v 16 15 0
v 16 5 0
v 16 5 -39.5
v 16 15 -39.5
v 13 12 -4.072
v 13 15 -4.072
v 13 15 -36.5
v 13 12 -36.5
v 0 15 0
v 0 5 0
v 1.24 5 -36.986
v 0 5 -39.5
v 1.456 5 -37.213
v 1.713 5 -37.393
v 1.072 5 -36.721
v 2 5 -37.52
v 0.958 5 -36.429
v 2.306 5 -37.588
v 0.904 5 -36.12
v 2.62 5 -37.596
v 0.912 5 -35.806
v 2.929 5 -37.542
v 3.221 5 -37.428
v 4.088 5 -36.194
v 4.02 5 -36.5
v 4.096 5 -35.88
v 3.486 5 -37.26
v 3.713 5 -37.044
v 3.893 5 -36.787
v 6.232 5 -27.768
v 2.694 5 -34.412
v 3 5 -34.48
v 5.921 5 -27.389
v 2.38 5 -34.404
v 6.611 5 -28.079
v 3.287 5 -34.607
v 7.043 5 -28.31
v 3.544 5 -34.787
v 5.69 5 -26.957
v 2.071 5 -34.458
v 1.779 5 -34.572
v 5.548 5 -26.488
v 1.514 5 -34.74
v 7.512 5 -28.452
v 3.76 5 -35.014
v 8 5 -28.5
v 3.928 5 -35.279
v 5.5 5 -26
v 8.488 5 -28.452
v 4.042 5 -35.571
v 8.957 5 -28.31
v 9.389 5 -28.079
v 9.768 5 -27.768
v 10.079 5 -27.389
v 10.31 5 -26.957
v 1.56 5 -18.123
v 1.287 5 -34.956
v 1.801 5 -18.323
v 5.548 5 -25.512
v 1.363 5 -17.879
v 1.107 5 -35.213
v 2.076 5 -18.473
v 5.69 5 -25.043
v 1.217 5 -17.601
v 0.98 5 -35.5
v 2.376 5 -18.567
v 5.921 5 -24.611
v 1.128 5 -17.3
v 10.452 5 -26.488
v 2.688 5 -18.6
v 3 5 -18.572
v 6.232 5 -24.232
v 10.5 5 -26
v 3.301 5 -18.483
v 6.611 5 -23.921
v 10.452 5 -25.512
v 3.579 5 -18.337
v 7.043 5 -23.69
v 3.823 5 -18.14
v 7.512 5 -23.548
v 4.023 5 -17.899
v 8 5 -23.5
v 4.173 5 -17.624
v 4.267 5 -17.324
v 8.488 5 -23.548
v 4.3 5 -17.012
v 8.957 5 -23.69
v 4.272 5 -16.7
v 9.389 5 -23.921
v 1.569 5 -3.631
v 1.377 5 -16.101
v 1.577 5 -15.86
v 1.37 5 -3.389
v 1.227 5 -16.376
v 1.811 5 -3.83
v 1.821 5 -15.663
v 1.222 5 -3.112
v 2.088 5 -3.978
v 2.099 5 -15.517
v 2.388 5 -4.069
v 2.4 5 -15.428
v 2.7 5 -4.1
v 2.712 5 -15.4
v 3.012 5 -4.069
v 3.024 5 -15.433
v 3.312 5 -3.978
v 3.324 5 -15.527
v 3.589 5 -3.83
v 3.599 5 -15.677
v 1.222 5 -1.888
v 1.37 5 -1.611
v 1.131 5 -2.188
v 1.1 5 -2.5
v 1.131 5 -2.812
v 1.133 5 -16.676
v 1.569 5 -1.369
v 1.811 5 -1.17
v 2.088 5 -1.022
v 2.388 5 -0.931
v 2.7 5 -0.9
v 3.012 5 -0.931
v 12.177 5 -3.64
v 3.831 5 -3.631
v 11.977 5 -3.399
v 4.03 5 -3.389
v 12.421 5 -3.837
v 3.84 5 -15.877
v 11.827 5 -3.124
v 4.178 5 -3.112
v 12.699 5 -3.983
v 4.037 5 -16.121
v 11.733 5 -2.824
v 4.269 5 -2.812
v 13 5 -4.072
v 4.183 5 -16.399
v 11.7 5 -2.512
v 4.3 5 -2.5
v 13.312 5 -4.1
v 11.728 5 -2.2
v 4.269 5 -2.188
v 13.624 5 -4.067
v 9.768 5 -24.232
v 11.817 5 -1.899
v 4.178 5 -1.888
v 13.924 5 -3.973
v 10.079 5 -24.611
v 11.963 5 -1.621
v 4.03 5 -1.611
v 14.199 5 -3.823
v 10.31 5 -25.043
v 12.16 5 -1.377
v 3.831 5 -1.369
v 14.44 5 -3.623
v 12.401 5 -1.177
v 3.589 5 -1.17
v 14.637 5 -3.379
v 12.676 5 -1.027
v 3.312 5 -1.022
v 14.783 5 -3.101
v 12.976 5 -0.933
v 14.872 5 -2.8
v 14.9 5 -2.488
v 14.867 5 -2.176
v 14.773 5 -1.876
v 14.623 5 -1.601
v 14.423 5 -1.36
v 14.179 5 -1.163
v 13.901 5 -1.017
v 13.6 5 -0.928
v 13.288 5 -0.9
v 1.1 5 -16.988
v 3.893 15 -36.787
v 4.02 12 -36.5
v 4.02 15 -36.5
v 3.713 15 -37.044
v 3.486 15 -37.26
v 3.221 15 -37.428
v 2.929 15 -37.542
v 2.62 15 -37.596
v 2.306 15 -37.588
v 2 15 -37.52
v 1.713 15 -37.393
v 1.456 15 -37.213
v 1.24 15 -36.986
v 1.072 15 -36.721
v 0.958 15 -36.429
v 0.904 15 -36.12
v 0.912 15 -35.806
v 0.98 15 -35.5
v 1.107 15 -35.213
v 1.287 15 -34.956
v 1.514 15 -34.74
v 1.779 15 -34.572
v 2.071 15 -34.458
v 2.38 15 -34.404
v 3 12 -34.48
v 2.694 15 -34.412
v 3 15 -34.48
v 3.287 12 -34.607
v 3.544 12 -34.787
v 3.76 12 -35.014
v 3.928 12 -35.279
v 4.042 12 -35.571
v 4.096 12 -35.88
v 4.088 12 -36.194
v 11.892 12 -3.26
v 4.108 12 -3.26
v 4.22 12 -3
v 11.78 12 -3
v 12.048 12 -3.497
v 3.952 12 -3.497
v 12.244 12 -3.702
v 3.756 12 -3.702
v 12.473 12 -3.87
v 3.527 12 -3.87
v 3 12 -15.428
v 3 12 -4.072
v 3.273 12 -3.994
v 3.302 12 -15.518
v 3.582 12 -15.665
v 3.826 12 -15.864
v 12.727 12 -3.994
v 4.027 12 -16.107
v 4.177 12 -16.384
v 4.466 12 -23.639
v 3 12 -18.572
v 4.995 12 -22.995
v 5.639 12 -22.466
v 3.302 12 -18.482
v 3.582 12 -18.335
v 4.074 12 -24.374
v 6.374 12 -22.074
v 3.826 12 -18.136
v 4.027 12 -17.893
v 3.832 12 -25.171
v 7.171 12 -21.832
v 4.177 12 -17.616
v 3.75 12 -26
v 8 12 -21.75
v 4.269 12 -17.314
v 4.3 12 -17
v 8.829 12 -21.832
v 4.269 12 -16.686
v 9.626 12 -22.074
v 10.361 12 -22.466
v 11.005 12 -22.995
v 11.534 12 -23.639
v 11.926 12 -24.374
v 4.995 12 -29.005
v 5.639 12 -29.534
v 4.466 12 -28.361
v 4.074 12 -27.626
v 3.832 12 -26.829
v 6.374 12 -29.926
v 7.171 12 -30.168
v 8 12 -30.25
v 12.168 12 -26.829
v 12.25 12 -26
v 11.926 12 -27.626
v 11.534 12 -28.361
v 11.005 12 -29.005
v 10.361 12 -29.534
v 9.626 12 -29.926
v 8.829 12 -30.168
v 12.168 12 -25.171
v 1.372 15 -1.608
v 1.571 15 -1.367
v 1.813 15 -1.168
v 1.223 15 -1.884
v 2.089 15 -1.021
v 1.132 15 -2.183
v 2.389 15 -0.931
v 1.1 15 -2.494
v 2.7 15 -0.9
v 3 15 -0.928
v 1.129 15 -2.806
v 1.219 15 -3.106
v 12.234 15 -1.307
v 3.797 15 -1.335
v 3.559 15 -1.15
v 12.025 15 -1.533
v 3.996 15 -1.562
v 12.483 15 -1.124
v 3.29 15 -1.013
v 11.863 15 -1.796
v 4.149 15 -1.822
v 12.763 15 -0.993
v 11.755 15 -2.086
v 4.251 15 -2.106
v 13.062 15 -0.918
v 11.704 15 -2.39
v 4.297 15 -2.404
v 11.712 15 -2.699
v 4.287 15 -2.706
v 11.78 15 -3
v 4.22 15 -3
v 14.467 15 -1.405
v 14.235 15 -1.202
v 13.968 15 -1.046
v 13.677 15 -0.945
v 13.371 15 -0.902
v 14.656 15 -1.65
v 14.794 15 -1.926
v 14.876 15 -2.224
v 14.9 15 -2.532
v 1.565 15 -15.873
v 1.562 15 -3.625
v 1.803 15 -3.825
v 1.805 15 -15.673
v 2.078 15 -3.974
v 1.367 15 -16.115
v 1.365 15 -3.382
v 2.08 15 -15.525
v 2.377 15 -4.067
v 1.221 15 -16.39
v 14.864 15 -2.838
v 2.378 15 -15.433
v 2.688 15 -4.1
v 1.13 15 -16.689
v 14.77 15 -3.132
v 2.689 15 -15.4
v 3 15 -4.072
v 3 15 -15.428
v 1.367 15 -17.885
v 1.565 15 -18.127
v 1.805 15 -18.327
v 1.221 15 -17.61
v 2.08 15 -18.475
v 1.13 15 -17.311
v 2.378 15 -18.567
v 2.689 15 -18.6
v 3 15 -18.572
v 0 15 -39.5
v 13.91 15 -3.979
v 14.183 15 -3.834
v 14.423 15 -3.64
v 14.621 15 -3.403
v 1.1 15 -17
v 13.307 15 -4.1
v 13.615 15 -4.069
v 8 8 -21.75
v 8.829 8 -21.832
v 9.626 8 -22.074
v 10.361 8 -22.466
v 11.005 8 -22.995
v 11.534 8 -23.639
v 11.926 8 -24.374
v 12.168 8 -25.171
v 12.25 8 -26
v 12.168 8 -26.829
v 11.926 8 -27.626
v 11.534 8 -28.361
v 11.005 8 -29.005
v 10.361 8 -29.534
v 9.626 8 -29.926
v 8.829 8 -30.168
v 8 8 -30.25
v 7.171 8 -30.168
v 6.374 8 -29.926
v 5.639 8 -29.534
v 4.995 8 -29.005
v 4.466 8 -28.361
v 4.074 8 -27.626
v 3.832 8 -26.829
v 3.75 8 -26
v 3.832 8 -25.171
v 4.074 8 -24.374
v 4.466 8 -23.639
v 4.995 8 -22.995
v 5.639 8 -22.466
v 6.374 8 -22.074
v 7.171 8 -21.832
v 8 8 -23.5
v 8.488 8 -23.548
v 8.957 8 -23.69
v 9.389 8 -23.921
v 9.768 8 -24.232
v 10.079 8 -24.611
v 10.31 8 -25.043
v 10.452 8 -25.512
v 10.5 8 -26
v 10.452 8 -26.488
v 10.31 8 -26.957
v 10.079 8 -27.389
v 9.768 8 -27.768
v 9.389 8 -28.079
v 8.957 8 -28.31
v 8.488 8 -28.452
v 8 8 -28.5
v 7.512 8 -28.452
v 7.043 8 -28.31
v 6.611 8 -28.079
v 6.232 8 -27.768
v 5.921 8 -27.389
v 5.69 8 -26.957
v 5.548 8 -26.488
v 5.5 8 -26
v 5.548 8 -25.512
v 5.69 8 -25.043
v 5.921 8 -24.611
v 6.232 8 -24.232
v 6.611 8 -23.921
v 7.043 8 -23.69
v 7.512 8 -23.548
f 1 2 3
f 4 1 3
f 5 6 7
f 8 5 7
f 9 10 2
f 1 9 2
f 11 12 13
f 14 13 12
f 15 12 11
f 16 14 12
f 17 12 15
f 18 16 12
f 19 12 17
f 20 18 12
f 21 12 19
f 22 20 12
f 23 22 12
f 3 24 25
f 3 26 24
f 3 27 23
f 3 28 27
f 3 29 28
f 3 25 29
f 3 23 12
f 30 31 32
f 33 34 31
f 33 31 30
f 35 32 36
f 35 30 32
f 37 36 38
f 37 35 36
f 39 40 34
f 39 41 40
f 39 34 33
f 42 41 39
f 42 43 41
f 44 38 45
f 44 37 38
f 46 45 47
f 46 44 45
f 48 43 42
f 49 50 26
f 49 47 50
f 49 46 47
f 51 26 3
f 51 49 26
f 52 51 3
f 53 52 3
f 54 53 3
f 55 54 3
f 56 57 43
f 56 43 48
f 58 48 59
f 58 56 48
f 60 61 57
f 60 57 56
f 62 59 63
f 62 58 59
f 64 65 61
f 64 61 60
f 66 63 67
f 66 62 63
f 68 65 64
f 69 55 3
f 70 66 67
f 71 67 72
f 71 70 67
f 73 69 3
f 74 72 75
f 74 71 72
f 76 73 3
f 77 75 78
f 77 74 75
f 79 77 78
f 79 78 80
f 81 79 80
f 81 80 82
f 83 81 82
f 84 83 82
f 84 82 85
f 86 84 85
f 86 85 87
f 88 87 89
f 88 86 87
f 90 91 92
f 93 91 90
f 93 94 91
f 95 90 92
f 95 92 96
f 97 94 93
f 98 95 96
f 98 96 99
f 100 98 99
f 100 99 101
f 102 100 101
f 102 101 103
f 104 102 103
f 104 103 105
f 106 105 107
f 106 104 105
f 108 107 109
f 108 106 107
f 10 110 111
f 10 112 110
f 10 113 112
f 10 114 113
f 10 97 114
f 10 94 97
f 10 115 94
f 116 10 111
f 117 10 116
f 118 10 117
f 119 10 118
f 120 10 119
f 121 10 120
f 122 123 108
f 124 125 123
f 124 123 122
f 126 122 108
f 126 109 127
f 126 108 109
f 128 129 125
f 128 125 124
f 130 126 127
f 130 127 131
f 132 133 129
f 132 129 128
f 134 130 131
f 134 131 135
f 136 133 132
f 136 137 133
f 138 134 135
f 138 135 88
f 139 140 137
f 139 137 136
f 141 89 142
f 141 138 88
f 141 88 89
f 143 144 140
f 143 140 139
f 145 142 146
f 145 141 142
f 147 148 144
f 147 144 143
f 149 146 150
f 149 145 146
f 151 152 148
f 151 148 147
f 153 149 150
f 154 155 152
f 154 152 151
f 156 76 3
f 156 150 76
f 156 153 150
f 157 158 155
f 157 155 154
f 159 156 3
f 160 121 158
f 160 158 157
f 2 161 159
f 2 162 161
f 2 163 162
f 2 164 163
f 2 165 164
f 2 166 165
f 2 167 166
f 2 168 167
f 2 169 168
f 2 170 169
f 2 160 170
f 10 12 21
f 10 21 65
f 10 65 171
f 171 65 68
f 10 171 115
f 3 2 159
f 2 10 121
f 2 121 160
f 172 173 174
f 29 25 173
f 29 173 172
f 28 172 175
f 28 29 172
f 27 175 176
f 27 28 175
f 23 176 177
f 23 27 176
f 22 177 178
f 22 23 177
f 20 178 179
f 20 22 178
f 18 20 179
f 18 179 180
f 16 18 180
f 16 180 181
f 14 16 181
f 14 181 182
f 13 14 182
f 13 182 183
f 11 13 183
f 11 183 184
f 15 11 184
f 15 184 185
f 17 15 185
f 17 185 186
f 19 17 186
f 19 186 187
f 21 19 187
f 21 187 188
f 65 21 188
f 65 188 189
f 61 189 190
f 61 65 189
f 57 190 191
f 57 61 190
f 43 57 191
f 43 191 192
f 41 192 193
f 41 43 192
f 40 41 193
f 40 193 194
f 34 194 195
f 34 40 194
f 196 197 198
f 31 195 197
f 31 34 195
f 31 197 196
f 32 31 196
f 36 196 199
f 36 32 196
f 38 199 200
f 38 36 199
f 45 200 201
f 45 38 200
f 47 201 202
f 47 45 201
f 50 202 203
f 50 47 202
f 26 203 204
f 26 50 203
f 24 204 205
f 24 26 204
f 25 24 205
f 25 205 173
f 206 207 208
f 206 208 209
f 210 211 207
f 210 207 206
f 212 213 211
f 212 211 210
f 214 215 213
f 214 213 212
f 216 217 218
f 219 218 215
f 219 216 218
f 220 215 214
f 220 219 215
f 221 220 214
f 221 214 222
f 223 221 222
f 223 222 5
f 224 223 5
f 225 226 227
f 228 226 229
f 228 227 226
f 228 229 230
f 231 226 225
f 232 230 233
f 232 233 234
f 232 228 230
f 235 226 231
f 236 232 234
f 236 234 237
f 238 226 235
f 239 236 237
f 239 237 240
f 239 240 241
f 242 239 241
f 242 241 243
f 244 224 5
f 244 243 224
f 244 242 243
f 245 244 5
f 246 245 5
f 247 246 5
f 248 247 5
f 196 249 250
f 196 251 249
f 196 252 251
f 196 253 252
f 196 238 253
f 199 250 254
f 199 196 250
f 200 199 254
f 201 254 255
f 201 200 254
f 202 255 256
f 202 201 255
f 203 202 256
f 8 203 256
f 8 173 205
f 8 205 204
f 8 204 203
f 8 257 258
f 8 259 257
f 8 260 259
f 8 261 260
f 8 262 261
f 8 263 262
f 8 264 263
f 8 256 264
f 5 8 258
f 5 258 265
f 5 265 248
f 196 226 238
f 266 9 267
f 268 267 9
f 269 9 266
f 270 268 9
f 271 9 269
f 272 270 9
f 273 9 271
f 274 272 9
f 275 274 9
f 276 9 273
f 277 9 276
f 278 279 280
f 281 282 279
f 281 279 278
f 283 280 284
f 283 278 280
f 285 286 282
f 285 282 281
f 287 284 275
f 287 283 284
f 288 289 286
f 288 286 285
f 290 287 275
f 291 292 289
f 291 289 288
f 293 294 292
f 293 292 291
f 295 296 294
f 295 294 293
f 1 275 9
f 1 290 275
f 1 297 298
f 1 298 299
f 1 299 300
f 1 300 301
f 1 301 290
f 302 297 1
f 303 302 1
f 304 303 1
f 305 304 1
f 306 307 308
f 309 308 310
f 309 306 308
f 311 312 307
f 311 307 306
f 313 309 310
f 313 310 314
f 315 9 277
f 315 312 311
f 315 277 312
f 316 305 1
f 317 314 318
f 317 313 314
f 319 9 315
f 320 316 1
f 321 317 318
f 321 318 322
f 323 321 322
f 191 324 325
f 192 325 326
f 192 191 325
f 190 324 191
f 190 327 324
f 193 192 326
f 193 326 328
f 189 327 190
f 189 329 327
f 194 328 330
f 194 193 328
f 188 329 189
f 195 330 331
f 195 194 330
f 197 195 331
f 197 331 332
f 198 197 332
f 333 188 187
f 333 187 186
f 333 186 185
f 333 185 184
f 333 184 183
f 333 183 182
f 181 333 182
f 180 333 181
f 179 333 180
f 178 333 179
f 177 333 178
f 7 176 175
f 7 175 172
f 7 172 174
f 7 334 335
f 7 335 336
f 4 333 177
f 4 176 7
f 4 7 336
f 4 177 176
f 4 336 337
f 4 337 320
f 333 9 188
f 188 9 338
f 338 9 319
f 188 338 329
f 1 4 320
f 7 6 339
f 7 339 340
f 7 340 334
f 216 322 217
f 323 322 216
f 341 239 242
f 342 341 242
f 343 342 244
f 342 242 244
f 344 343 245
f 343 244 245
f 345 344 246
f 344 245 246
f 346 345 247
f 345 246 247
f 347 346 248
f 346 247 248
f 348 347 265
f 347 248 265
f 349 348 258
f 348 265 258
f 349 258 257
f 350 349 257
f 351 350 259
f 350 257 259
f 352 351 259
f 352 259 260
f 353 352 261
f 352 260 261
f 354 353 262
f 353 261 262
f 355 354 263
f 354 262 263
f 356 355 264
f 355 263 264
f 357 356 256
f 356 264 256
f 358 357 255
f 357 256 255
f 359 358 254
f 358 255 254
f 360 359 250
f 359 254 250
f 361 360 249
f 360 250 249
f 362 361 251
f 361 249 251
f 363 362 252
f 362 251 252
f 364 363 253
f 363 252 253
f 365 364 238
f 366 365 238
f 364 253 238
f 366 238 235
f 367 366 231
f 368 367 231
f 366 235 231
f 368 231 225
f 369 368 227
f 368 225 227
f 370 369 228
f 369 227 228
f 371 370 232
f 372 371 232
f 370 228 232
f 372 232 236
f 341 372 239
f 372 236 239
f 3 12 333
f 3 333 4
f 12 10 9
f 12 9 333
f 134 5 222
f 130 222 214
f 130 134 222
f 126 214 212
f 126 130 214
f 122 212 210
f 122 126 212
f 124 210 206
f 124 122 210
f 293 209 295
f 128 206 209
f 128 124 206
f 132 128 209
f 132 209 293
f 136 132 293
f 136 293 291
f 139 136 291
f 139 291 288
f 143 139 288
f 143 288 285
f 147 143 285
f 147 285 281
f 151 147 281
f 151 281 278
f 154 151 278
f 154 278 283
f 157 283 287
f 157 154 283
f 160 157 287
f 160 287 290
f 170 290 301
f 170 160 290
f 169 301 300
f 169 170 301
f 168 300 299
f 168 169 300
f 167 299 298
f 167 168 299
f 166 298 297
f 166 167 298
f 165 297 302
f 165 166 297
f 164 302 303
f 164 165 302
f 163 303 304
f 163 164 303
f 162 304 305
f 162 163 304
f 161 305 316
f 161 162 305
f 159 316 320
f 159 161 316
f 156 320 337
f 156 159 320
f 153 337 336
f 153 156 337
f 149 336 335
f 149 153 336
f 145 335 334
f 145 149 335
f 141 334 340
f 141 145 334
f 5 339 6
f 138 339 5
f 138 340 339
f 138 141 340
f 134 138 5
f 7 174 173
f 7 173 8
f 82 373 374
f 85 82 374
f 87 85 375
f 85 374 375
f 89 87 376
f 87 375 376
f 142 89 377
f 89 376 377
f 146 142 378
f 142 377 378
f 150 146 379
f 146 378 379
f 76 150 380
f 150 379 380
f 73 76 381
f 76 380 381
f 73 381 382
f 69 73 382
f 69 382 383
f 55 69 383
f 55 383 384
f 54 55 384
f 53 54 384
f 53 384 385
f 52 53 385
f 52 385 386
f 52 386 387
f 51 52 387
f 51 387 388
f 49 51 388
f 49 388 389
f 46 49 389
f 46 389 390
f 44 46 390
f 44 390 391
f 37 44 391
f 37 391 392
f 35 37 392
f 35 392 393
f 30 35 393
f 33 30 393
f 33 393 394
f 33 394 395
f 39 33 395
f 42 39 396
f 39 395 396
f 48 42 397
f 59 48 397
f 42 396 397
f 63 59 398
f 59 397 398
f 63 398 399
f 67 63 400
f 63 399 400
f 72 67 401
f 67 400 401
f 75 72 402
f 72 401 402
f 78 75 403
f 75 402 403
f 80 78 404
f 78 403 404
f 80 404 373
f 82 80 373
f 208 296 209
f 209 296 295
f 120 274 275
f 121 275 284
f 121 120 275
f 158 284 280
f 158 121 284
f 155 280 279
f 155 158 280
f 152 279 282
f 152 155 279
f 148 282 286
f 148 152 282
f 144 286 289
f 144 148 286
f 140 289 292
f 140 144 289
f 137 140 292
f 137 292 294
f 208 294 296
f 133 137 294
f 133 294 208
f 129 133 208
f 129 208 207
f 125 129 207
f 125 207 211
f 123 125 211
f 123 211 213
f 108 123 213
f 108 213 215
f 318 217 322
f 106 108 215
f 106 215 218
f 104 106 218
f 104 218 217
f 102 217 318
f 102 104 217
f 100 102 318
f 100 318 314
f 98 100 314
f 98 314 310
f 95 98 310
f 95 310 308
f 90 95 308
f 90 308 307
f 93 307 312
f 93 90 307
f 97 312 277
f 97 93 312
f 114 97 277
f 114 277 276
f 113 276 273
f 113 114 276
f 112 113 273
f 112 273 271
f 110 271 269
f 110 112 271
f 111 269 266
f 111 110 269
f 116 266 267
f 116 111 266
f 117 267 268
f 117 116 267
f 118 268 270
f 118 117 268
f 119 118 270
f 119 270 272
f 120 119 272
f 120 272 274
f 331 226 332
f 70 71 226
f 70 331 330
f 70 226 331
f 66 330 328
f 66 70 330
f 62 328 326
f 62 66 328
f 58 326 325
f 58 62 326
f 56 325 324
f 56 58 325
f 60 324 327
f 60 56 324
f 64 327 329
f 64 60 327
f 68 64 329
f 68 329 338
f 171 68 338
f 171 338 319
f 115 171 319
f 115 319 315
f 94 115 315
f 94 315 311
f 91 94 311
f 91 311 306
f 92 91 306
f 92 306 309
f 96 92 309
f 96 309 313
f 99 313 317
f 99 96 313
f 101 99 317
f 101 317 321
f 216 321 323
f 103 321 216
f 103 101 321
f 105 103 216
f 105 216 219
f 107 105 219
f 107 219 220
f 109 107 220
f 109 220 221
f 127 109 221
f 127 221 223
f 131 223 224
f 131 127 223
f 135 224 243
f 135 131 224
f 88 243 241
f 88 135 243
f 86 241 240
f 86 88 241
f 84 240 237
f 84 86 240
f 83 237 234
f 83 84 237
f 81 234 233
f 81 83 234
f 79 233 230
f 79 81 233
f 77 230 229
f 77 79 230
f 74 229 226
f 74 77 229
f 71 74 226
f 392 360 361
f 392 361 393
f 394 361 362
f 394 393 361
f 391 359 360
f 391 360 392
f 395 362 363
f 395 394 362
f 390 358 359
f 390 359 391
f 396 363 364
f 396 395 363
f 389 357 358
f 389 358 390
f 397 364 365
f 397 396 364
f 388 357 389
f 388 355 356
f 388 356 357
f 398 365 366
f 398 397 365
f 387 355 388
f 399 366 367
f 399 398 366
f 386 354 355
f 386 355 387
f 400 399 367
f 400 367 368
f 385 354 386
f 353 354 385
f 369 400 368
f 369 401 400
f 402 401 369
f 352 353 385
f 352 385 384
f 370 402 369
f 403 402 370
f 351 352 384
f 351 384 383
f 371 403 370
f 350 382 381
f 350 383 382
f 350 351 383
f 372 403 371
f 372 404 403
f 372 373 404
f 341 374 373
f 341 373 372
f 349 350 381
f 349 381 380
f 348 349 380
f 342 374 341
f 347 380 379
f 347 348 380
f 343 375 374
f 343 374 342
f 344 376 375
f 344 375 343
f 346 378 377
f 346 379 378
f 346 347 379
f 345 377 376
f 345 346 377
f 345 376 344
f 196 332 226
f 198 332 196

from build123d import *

# Parameters (mm, degrees)
SKETCH1_W               = 16
SKETCH1_H               = 39.5
BOSS_EXTRUDE1_DEPTH     = 15
SKETCH2_W               = 10
SKETCH2_H               = 33.5
CUT_EXTRUDE1_DEPTH      = 3
CUT_EXTRUDE2_DEPTH      = 45.274710615
CUT_EXTRUDE2_DEPTH_BACK = 45.274710615
SKETCH3_R               = 1.6
CUT_EXTRUDE3_DEPTH      = 3
CUT_EXTRUDE3_DEPTH_BACK = 46.180194776
SKETCH4_R               = 1.6
SKETCH5_R               = 2.5
CUT_EXTRUDE4_DEPTH      = 20
SKETCH8_R               = 4.25
CUT_EXTRUDE5_DEPTH      = 4
SKETCH9_W               = 23.074046619
SKETCH9_H               = 49.619494536
CUT_EXTRUDE6_DEPTH      = 5


with BuildPart() as part:
    # Sketch1 → Boss-Extrude1 (new body)
    with BuildSketch(Plane(origin=(0, 0, 0), x_dir=(1, 0, 0), z_dir=(0, 1, 0))):
        with Locations((8, 19.75)):
            Rectangle(SKETCH1_W, SKETCH1_H)
    extrude(amount=BOSS_EXTRUDE1_DEPTH)

    # Sketch2 → Cut-Extrude1 (cut)
    with BuildSketch(Plane(origin=(0, 15, 0), x_dir=(1, 0, 0), z_dir=(0, 1, 0))):
        with Locations((8, 19.75)):
            Rectangle(SKETCH2_W, SKETCH2_H)
    extrude(amount=-CUT_EXTRUDE1_DEPTH, mode=Mode.SUBTRACT)

    # Sketch3 → Cut-Extrude2 (cut, two sides: drawn at the far end of the back side and taken through both)
    with BuildSketch(Plane(origin=(0, 12, 0), x_dir=(1, 0, 0), z_dir=(0, 1, 0)).offset(-CUT_EXTRUDE2_DEPTH_BACK)):
        with Locations((2.7, 2.5)):
            Circle(SKETCH3_R)
    extrude(amount=CUT_EXTRUDE2_DEPTH + CUT_EXTRUDE2_DEPTH_BACK, mode=Mode.SUBTRACT)

    # Sketch4 → Cut-Extrude3 (cut, two sides: drawn at the far end of the back side and taken through both)
    with BuildSketch(Plane(origin=(0, 15, 0), x_dir=(1, 0, 0), z_dir=(0, 1, 0)).offset(-CUT_EXTRUDE3_DEPTH_BACK)):
        with Locations((13.3, 2.5)):
            Circle(SKETCH4_R)
        with Locations((2.7, 17)):
            Circle(SKETCH4_R)
        with Locations((2.5, 36)):
            Circle(SKETCH4_R)
    extrude(amount=CUT_EXTRUDE3_DEPTH + CUT_EXTRUDE3_DEPTH_BACK, mode=Mode.SUBTRACT)

    # Sketch5 → Cut-Extrude4 (cut)
    with BuildSketch(Plane(origin=(0, 12, 0), x_dir=(1, 0, 0), z_dir=(0, 1, 0))):
        with Locations((8, 26)):
            Circle(SKETCH5_R)
    extrude(amount=-CUT_EXTRUDE4_DEPTH, mode=Mode.SUBTRACT)

    # Sketch8 → Cut-Extrude5 (cut)
    with BuildSketch(Plane(origin=(0, 12, 0), x_dir=(1, 0, 0), z_dir=(0, 1, 0))):
        with Locations((8, 26)):
            Circle(SKETCH8_R)
    extrude(amount=-CUT_EXTRUDE5_DEPTH, mode=Mode.SUBTRACT)

    # Sketch9 → Cut-Extrude6 (cut)
    with BuildSketch(Plane.XZ):
        with Locations((7.55036405, -17.360616358)):
            Rectangle(SKETCH9_W, SKETCH9_H)
    extrude(amount=-CUT_EXTRUDE6_DEPTH, mode=Mode.SUBTRACT)


solid = part.part
